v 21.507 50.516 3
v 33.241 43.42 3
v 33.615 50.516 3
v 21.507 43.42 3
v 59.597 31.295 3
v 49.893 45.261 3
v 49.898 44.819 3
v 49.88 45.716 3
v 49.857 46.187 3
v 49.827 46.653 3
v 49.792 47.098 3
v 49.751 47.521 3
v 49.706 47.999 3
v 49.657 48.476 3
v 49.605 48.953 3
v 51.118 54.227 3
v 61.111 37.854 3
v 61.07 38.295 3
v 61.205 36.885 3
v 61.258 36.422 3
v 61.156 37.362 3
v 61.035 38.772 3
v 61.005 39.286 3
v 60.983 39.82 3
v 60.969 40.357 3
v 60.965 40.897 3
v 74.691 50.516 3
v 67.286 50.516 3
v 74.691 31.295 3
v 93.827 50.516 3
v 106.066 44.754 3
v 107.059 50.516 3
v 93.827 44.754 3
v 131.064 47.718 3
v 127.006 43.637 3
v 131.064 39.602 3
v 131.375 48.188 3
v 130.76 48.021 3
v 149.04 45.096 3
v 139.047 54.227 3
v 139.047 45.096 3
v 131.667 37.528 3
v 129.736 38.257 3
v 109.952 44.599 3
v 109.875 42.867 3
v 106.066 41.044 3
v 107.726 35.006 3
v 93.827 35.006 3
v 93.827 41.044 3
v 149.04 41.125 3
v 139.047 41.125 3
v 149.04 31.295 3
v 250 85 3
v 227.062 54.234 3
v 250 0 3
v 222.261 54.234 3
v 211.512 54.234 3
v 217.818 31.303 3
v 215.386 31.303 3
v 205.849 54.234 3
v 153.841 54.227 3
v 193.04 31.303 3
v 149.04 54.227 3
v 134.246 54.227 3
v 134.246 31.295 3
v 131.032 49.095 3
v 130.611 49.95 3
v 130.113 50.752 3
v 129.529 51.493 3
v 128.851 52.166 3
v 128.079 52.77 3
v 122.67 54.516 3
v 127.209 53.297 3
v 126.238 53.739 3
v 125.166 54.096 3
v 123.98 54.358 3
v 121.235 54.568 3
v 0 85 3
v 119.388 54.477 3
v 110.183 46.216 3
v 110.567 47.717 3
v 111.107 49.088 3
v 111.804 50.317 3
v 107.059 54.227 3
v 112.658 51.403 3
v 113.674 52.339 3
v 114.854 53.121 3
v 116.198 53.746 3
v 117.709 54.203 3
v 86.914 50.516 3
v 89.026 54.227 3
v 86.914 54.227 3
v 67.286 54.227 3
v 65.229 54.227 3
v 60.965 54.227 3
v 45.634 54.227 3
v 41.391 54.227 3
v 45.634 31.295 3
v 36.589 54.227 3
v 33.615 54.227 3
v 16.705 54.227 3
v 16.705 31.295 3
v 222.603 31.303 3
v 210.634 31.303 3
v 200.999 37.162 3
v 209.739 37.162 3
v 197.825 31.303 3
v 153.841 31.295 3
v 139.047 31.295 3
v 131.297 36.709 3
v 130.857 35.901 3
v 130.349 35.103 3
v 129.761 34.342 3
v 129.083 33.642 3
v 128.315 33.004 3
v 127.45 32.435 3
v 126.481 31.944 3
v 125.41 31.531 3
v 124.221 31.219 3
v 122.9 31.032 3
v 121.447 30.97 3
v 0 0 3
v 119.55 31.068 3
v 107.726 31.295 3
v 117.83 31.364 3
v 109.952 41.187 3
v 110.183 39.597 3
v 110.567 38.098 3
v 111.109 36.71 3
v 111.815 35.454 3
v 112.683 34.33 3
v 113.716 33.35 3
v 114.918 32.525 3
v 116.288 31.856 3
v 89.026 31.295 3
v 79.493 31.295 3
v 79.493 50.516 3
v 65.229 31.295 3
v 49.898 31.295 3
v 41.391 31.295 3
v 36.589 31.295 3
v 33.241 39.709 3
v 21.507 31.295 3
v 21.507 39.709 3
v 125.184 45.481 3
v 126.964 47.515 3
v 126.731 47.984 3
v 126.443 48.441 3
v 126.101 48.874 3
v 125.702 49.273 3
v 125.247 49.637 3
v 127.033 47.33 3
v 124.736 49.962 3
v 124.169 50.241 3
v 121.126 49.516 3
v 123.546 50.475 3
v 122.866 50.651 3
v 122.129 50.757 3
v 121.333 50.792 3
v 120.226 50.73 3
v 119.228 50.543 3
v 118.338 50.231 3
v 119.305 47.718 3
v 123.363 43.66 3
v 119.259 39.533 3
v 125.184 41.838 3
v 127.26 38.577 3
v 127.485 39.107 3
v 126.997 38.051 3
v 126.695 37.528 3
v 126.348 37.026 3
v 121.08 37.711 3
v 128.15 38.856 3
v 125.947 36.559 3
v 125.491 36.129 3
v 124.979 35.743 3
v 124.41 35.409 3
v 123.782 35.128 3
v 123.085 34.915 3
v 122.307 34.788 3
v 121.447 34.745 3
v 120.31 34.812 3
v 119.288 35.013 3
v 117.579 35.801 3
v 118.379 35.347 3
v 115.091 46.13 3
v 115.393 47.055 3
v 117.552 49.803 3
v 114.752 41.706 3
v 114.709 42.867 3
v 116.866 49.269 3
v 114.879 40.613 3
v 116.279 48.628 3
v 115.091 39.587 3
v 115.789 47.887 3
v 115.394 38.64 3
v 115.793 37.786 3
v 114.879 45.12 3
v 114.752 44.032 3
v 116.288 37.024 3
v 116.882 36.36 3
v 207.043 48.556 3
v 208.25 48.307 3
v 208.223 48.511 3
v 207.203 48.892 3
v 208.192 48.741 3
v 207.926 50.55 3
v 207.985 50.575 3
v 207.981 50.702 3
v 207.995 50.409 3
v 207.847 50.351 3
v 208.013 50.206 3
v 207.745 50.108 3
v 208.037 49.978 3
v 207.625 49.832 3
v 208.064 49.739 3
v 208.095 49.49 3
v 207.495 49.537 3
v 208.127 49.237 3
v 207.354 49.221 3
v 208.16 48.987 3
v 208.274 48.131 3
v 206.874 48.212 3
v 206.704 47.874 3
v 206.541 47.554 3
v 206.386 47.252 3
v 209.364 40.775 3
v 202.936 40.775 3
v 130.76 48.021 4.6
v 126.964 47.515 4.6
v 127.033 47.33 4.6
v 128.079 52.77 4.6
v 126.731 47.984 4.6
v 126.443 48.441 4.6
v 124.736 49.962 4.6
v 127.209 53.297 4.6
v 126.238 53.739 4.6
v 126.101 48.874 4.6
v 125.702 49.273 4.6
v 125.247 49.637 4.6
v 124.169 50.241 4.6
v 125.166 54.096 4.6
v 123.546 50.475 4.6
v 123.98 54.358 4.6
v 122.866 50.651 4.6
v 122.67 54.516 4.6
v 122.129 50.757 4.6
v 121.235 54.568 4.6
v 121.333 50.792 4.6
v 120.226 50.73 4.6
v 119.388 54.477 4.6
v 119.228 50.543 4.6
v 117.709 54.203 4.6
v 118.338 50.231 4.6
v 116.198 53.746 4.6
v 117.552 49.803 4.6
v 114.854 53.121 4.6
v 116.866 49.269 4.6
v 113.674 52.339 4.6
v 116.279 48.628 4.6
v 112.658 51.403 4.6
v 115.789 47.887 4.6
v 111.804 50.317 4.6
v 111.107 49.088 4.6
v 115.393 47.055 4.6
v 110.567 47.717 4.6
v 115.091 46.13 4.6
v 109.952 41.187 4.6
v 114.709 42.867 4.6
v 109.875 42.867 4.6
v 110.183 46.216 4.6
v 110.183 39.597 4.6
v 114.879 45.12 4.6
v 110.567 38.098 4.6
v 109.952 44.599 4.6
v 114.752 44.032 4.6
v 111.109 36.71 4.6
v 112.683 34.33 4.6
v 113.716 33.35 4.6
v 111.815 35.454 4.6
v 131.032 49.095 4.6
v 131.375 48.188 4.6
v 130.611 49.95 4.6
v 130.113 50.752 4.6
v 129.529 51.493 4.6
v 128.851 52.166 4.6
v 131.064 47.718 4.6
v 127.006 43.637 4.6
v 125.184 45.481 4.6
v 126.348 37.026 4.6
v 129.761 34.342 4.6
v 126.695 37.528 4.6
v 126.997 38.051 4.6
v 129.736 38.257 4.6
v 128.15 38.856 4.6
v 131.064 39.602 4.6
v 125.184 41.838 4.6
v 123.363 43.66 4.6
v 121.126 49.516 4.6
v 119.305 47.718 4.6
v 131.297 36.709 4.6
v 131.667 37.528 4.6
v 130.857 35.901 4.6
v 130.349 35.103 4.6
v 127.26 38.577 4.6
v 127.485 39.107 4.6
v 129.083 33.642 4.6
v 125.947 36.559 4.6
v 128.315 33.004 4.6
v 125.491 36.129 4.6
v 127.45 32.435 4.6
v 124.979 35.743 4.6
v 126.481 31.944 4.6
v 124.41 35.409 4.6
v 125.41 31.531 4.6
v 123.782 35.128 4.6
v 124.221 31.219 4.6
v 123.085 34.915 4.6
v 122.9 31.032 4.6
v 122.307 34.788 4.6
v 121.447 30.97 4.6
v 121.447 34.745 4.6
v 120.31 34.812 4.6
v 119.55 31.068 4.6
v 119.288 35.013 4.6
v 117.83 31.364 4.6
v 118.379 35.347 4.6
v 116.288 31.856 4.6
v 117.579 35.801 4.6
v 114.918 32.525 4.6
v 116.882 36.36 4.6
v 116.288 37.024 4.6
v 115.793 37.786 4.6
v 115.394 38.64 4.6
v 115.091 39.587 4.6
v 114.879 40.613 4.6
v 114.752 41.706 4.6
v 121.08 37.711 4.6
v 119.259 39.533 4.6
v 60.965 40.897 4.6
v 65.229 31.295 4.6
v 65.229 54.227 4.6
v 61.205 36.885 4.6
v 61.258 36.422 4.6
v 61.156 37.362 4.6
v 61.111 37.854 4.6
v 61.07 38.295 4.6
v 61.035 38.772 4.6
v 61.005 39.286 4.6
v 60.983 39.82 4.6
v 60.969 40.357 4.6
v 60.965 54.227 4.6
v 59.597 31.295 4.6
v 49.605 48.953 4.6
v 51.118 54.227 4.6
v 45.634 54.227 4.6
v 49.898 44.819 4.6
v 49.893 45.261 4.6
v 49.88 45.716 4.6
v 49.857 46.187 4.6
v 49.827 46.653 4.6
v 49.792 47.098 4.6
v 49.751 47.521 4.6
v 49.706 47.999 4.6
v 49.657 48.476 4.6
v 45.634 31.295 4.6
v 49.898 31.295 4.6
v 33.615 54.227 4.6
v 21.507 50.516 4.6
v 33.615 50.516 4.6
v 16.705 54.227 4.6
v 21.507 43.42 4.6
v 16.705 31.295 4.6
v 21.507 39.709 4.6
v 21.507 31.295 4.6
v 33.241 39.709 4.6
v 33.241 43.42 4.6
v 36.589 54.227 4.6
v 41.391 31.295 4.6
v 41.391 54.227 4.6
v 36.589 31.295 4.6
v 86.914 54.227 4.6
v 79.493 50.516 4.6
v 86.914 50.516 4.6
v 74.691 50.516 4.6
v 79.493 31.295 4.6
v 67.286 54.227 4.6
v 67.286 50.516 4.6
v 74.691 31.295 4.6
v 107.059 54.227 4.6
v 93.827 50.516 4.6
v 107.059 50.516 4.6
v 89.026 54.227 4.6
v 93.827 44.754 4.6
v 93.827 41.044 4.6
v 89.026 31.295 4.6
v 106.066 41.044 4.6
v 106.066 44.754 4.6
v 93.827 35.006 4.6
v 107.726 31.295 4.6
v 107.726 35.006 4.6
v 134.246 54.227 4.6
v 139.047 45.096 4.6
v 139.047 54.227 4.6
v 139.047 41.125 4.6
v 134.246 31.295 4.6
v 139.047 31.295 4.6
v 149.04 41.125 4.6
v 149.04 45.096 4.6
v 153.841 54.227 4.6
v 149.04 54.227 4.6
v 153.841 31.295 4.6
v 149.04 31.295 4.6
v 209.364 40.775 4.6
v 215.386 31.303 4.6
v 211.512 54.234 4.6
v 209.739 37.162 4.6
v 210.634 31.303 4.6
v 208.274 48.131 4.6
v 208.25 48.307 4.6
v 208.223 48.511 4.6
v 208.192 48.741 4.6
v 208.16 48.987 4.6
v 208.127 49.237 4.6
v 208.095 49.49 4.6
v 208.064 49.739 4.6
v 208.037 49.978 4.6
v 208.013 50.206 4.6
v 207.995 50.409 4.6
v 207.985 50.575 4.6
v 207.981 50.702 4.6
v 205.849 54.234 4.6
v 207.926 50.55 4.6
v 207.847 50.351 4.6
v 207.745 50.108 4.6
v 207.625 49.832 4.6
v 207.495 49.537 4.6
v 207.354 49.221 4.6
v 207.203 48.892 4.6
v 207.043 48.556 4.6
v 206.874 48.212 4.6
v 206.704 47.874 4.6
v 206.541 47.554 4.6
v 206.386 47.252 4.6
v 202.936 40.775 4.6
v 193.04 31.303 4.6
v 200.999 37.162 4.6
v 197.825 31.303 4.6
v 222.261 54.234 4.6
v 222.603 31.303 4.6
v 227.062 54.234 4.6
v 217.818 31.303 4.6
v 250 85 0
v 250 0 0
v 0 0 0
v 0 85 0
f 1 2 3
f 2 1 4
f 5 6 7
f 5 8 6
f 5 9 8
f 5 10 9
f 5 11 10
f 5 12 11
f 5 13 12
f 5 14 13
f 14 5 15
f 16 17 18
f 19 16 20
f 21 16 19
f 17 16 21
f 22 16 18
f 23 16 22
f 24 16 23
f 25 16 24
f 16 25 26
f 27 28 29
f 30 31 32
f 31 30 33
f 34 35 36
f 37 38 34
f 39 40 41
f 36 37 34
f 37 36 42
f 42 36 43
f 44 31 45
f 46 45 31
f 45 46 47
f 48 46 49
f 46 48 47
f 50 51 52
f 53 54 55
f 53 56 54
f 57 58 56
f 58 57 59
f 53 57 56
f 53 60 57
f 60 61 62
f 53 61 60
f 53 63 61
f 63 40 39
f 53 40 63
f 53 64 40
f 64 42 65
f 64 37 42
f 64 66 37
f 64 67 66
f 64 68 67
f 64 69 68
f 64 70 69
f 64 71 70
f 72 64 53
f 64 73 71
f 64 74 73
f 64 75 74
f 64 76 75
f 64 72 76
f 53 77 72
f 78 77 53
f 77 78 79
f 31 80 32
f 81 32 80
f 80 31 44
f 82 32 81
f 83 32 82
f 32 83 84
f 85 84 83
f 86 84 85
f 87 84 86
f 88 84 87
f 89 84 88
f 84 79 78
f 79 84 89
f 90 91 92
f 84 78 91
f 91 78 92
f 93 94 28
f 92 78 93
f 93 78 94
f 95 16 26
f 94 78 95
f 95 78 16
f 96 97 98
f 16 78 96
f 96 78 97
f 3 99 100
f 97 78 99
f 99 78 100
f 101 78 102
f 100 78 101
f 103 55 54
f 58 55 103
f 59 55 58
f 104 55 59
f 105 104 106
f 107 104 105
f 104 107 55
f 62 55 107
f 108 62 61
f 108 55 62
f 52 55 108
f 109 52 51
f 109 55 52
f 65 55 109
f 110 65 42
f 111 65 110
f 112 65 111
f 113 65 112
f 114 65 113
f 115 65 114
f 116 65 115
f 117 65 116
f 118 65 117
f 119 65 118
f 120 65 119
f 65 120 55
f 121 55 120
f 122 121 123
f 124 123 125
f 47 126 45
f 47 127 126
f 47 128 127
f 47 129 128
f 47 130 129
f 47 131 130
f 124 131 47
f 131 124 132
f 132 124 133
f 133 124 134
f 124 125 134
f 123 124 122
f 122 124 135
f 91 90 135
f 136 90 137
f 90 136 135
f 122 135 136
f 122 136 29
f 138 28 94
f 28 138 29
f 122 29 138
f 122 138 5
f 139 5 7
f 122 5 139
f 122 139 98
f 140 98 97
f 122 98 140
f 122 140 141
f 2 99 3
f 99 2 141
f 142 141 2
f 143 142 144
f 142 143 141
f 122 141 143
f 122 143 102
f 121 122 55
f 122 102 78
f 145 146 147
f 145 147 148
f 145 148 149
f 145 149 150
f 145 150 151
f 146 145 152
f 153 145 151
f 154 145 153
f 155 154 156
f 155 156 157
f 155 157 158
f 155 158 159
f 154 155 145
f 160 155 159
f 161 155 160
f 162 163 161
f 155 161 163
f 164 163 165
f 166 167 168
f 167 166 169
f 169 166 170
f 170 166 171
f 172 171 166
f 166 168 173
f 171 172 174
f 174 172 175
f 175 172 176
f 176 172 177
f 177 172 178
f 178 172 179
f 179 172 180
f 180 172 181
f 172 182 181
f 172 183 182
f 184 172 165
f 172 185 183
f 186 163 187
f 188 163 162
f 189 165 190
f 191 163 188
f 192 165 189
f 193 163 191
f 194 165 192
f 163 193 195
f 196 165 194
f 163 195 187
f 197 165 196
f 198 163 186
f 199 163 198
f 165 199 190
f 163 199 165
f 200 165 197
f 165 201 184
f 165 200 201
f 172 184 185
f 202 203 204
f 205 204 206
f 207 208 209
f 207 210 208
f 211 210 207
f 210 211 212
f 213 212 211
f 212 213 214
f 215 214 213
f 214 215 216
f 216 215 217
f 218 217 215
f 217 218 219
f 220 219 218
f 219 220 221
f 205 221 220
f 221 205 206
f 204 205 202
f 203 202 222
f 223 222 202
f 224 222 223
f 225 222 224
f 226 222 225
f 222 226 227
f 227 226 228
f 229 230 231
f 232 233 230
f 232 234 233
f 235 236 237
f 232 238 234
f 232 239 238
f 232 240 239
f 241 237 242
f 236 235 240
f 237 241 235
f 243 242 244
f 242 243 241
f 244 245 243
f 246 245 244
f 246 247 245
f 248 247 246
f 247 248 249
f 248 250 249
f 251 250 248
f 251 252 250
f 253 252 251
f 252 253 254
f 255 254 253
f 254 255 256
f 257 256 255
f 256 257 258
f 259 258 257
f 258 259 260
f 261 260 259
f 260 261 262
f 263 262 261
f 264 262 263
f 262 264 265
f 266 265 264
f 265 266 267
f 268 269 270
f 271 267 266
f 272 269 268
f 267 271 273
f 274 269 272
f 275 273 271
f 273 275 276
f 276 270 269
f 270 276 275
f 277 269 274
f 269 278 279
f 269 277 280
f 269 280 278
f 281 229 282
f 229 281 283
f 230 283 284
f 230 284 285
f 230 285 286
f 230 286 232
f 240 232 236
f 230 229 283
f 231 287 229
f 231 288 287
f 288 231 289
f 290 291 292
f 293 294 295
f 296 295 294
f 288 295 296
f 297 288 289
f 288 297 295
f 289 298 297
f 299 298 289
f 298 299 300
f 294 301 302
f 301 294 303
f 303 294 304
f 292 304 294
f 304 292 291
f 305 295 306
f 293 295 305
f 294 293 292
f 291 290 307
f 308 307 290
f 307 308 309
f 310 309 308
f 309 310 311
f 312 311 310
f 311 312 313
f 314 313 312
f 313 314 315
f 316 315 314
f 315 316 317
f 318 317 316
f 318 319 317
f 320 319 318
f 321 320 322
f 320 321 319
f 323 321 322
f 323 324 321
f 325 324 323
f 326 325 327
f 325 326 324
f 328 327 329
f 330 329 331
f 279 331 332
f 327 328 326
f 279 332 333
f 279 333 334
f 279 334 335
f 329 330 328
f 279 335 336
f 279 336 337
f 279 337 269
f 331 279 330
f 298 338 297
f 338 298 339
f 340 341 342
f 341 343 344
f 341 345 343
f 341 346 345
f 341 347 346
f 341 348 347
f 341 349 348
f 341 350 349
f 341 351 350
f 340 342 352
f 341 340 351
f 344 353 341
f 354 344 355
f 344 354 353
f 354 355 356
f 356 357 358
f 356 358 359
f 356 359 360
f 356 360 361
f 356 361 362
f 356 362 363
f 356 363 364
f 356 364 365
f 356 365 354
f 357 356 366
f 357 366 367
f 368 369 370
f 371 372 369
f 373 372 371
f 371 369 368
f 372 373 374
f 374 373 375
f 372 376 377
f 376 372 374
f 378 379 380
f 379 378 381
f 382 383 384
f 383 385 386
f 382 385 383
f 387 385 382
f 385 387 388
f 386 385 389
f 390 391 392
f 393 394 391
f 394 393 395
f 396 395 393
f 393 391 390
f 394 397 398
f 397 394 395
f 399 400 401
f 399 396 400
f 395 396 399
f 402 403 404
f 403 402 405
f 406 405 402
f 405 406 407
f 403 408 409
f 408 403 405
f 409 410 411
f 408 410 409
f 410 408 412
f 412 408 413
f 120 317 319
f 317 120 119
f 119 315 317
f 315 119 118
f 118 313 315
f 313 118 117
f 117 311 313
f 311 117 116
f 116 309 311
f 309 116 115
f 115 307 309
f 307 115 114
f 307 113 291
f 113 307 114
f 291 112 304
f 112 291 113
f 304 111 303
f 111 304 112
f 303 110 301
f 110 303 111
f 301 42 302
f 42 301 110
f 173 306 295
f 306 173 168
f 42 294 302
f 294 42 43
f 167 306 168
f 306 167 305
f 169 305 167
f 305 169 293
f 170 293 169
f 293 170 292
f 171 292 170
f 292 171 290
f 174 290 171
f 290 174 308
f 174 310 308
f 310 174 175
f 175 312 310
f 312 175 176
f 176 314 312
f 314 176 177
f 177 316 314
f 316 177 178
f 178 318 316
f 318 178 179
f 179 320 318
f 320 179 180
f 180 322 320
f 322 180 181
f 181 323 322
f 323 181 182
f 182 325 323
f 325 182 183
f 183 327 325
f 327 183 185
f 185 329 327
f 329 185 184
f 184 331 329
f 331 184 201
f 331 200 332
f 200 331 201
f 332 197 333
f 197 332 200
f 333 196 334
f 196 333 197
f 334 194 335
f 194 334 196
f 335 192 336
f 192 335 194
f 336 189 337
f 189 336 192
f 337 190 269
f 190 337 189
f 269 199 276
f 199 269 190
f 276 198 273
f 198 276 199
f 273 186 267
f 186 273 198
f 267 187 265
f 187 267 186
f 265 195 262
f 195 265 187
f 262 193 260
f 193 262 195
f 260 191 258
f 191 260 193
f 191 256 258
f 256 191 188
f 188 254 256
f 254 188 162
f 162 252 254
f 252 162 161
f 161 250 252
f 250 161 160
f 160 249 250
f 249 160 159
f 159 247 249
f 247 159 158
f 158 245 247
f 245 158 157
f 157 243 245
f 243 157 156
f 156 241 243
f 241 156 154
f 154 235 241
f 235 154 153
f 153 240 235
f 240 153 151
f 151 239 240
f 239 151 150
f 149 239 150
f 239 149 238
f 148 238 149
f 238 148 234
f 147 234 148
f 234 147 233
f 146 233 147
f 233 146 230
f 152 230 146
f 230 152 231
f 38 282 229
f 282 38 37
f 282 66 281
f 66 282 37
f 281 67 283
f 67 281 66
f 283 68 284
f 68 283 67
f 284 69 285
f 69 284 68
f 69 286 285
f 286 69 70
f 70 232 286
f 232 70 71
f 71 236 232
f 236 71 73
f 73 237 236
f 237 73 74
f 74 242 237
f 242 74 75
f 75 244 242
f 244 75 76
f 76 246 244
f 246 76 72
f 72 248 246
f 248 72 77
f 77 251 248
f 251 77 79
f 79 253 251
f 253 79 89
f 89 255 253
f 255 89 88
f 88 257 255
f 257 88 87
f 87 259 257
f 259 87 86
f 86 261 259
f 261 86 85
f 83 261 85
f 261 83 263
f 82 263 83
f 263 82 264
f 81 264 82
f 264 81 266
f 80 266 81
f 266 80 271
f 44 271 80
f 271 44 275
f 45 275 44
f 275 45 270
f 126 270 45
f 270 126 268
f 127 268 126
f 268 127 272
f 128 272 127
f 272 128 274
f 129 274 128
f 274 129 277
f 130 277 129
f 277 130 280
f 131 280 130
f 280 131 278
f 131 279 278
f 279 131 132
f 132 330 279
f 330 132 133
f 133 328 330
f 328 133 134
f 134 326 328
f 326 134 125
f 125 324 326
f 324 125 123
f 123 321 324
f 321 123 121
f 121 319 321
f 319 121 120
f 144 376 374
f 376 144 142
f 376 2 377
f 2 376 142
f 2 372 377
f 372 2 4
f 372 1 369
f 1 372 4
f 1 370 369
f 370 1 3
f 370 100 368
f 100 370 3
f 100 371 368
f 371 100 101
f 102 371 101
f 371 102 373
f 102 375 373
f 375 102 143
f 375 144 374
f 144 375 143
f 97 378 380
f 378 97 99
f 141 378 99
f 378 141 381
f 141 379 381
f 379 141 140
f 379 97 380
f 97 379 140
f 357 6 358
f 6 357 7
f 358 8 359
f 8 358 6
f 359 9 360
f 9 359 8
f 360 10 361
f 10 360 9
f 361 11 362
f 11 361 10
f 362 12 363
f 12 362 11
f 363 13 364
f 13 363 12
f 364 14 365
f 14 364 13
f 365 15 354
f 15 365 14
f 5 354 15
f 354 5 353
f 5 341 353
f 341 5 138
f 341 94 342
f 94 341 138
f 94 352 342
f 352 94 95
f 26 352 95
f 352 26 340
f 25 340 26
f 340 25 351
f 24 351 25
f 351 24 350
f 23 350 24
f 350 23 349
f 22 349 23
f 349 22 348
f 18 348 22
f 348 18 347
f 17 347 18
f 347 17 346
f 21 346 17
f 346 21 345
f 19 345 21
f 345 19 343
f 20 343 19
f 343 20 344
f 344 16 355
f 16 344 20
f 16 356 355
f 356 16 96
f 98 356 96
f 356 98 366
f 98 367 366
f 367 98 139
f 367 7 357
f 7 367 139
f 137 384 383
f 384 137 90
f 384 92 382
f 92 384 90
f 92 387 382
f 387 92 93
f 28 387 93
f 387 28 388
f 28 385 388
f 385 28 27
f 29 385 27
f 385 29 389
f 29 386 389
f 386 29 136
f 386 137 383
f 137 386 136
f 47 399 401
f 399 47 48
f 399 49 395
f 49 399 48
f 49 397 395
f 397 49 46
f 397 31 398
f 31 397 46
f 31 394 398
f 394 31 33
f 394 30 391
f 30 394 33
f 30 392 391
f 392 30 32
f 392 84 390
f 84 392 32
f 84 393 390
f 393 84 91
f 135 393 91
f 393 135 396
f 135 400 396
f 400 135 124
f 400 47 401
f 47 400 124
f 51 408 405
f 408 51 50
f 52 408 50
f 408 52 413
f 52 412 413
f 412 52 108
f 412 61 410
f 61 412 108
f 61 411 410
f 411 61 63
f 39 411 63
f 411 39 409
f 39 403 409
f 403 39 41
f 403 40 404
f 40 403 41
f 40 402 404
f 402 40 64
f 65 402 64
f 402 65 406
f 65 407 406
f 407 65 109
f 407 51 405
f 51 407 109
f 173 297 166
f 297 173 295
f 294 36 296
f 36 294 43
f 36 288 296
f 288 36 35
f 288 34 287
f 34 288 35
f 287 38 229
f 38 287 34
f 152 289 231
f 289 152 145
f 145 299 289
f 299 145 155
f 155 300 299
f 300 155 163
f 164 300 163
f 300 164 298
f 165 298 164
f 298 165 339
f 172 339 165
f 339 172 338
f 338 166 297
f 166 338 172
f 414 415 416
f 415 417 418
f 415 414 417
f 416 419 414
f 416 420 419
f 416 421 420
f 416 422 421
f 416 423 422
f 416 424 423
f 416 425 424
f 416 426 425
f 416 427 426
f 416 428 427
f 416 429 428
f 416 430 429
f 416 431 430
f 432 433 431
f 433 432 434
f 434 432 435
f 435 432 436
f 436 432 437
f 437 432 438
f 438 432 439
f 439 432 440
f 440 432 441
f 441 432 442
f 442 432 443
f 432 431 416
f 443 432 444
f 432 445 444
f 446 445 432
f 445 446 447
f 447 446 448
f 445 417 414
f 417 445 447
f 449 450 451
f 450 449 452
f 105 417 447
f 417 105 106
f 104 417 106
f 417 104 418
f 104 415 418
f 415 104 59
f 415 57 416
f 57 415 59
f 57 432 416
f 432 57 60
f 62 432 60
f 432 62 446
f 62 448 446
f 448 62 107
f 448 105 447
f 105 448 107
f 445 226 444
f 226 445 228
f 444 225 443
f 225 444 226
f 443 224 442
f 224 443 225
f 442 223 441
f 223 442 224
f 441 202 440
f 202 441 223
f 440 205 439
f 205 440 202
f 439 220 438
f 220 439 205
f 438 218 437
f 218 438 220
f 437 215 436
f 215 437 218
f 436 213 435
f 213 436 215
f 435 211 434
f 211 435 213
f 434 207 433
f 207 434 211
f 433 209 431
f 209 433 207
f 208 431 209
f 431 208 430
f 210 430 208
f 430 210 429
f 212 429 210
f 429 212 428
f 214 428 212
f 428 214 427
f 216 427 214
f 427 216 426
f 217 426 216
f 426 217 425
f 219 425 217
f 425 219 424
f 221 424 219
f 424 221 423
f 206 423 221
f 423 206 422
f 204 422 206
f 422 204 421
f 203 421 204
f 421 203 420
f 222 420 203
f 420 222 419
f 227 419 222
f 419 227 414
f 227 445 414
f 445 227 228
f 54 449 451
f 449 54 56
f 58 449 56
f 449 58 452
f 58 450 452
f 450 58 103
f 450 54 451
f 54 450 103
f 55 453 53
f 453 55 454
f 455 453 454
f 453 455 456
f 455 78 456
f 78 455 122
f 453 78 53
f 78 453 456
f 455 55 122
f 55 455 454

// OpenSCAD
/*
FINTECH × AI Nameplat// Text parameters - DOUBLE SIZE
font_size_fintech = 28;   // Doubled from 14mm
font_size_x = 20;         // Doubled from 10mm
font_size_ai = 28;        // Doubled from 14mm
font = "Liberation Sans:style=Bold"; // Reliable system font
font_italic = "Liberation Sans:style=Bold Italic";

// Positioning - doubled for 2x larger plate
margin = 40;  // Doubled margin

// Manual positioning for visual balance (doubled spacing)
fintech_x = 100;     // Doubled from 50mm
x_x = 150;           // Center × in the middle of the plate (300/2)  
ai_x = 250;          // Doubled from 125mmb X1
OpenSCAD Script

Design specifications:
- Black rectangular base plate (3mm thick)
- Raised text (3-4mm above base, total height 6-7mm)
- FINTECH: Blue, strong upright font, left side
- ×: Gray, enlarged (~130%), center
- AI: White, italic effect, right side

For multi-color printing:
1. Print base in black
2. Change filament at layer corresponding to base height
3. Print text layers in respective colors
*/

// === PARAMETERS ===
// Plate dimensions - DOUBLE SIZE (2x larger)
plate_width = 300;   // Doubled from 150mm 
plate_height = 100;  // Doubled from 50mm
base_thickness = 3;
text_height = 1.6; // More natural, shallow raised text
total_height = base_thickness + text_height;

// Text parameters - SCALED UP
font_size_fintech = 14;   // Increased from 11mm
font_size_x = 10;         // Increased from 8mm
font_size_ai = 14;        // Increased from 11mm
font = "Liberation Sans:style=Bold"; // Reliable system font
font_italic = "Liberation Sans:style=Bold Italic";

// Positioning - adjusted for larger plate
margin = 20;  // Increased margin

// Manual positioning for visual balance (scaled for larger plate)
fintech_x = 50;      // Moved right proportionally
x_x = 105;            // Center × in the middle of the plate (150/2)  
ai_x = 125;          // Moved left proportionally for balance

// Background carving parameters
carve_depth = 0.6;      // Shallower carving
carve_radius = 0;       // Smaller radius
carve_margin = 4;       // Larger margin for better proportions

// Text depth
text_depth = 0.3; // Shallow depth for natural look

// === COLORS FOR PREVIEW ===
color_base = [0.1, 0.1, 0.1];      // Dark gray (will be black when printed)
color_fintech = [0.2, 0.4, 0.8];   // Blue
color_x = [0.6, 0.6, 0.6];         // Gray  
color_ai = [0.9, 0.9, 0.9];        // White

// === MODULES ===

// Simple, manifold-safe base plate
module base_plate() {
    // Just a simple solid cube - no complex operations
    color(color_base)
    cube([plate_width, plate_height, base_thickness]);
}

// FINTECH text (ultra-clean manifold construction)
module fintech_text() {
    translate([fintech_x, plate_height/2, base_thickness]) {
        color(color_fintech)
        linear_extrude(height = text_height, convexity = 10) {
            text("FINTECH", 
                 size = font_size_fintech, 
                 font = font,
                 halign = "center", 
                 valign = "center");
        }
    }
}

// × symbol (ultra-clean manifold construction)
module x_symbol() {
    translate([x_x, plate_height/2, base_thickness]) {
        color(color_x)
        linear_extrude(height = text_height, convexity = 10) {
            text("×", 
                 size = font_size_x * 1.4, 
                 font = font,
                 halign = "center", 
                 valign = "center");
        }
    }
}

// AI text (ultra-clean manifold construction)
module ai_text() {
    translate([ai_x, plate_height/2, base_thickness]) {
        color(color_ai)
        linear_extrude(height = text_height, convexity = 10) {
            text("AI", 
                 size = font_size_ai, 
                 font = font_italic,
                 halign = "center", 
                 valign = "center");
        }
    }
}

// === ASSEMBLY ===

// Debug module to show positioning (comment out for final print)
module debug_positions() {
    // Show position markers
    color("red") {
        translate([fintech_x, plate_height/2 - 2, base_thickness + text_height]) 
            cube([1, 4, 0.5], center=true);
        translate([x_x, plate_height/2 - 2, base_thickness + text_height]) 
            cube([1, 4, 0.5], center=true);
        translate([ai_x, plate_height/2 - 2, base_thickness + text_height]) 
            cube([1, 4, 0.5], center=true);
    }
}

// Test module for manifold debugging
module simple_test() {
    union() {
        // Just base and one text element
        cube([plate_width, plate_height, base_thickness]);
        translate([60, 20, base_thickness]) {
            linear_extrude(height = text_height) {
                text("TEST", size = 8, halign = "center", valign = "center");
            }
        }
    }
}

// Main nameplate assembly - using union for manifold safety
module nameplate() {
    // Use union to combine all parts into a single manifold
    union() {
        base_plate();
        fintech_text();
        x_symbol();
        ai_text();
    }
}

// === HEIGHT-SEPARATED MULTI-COLOR (EFFICIENT) ===
// Each color prints at different Z-heights - no per-layer color changes

module efficient_multi_color() {
    // Layer 1-20: Only black base (3mm) - no other colors on these layers
    color(color_base)
    cube([plate_width, plate_height, base_thickness]);
    
    // Layer 21-32: All text in ONE color (1.6mm) - choose your preferred color
    translate([0, 0, base_thickness]) {
        color(color_fintech) // All text will be this color (blue)
        union() {
            // FINTECH text
            translate([fintech_x, plate_height/2, 0]) {
                linear_extrude(height = text_height, convexity = 10) {
                    text("FINTECH", 
                         size = font_size_fintech, 
                         font = font, 
                         halign = "center", 
                         valign = "center");
                }
            }
            // × symbol  
            translate([x_x, plate_height/2, 0]) {
                linear_extrude(height = text_height, convexity = 10) {
                    text("×", 
                         size = font_size_x * 1.4, 
                         font = font, 
                         halign = "center", 
                         valign = "center");
                }
            }
            // AI text
            translate([ai_x, plate_height/2, 0]) {
                linear_extrude(height = text_height, convexity = 10) {
                    text("AI", 
                         size = font_size_ai, 
                         font = font_italic, 
                         halign = "center", 
                         valign = "center");
                }
            }
        }
    }
}

// === PRINTER-COMPATIBLE LARGE VERSION ===
// Scaled to fit Bambu X1 while still being very large

module nameplate_fit_printer() {
    // Dimensions that fit Bambu X1 (256mm max) but still very large
    fit_width = 250;   // Just under printer limit
    fit_height = 85;   // Proportionally scaled
    fit_fintech_x = 85;
    fit_x_x = 125;     // Center
    fit_ai_x = 210;
    
    // Base plate
    color(color_base)
    cube([fit_width, fit_height, base_thickness]);
    
    // All text in blue
    translate([0, 0, base_thickness]) {
        color(color_fintech)
        union() {
            // FINTECH text
            translate([fit_fintech_x, fit_height/2, 0]) {
                linear_extrude(height = text_height, convexity = 10) {
                    text("FINTECH", size = 24, font = font, halign = "center", valign = "center");
                }
            }
            // × symbol  
            translate([fit_x_x, fit_height/2, 0]) {
                linear_extrude(height = text_height, convexity = 10) {
                    text("×", size = 17, font = font, halign = "center", valign = "center");
                }
            }
            // AI text
            translate([fit_ai_x, fit_height/2, 0]) {
                linear_extrude(height = text_height, convexity = 10) {
                    text("AI", size = 24, font = font_italic, halign = "center", valign = "center");
                }
            }
        }
    }
}

// === SEPARATE PARTS FOR MULTI-COLOR PRINTING ===
// Each part prints in place with different colors

// Part 1: Base plate (Black)
module part_base() {
    base_plate();
}

// Part 2: FINTECH text (Blue) 
module part_fintech() {
    fintech_text();
}

// Part 3: × symbol (Gray)
module part_x() {
    x_symbol();
}

// Part 4: AI text (White)
module part_ai() {
    ai_text();
}

// Combined layout for multi-color printing
// All parts print together but assigned different colors in slicer
module multi_color_layout() {
    part_base();     // Will be assigned black in slicer
    part_fintech();  // Will be assigned blue in slicer  
    part_x();        // Will be assigned gray in slicer
    part_ai();       // Will be assigned white in slicer
}

// === ADVANCED: SEPARATE BY HEIGHT FOR AUTO-COLOR CHANGE ===

// Method for height-based color changes in Bambu Studio
module base_layer() {
    // Only the base plate (0 to 3mm)
    intersection() {
        nameplate();
        cube([plate_width, plate_height, base_thickness]);
    }
}

module text_layer() {
    // Only the text parts (3mm to 4.6mm)
    intersection() {
        nameplate();
        translate([0, 0, base_thickness])
            cube([plate_width, plate_height, text_height]);
    }
}

// === RENDERING ===

// Conservative settings for manifold safety
$fn = 16; // Lower for preview, increase to 32 for final export

// === CHOOSE YOUR SIZE ===

// OPTION 1: MASSIVE 300×100mm (TOO LARGE for Bambu X1)
// efficient_multi_color();

// OPTION 2: LARGE but fits printer 250×85mm (RECOMMENDED)
nameplate_fit_printer();

// === ALTERNATIVE METHODS ===
// multi_color_layout();     // Expensive multi-color method

// === INFORMATION OUTPUT ===
echo("=== NAMEPLATE SPECIFICATIONS ===");
echo(str("Dimensions: ", plate_width, "mm × ", plate_height, "mm × ", total_height, "mm"));
echo(str("Base thickness: ", base_thickness, "mm"));
echo(str("Text height: ", text_height, "mm (natural shallow raise)"));
echo(str("Total height: ", total_height, "mm"));
echo("");
echo("=== DOUBLE SIZE NAMEPLATE SPECIFICATIONS ===");
echo(str("MASSIVE Dimensions: ", plate_width, "mm × ", plate_height, "mm × ", total_height, "mm"));
echo(str("Previous small: 120mm × 40mm"));
echo(str("Previous large: 150mm × 50mm")); 
echo(str("Current DOUBLE: 300mm × 100mm (4x area!)"));
echo(str("Base thickness: ", base_thickness, "mm"));
echo(str("Text height: ", text_height, "mm"));
echo(str("LARGE font sizes: FINTECH/AI=", font_size_fintech, "mm, ×=", font_size_x, "mm"));
echo("");
echo("⚠️  IMPORTANT: Check if this fits your Bambu A1 build plate!");
echo("Bambu A1 max: 256×256×256mm - Your design: 300×100mm");
echo("Width is TOO LARGE for single print - see options below");
echo("");
echo("=== DESIGN IMPROVEMENTS ===");
echo("✓ Reliable Arial font for better rendering");
echo("✓ Proper visual balance with manual positioning");
echo("✓ × symbol truly centered on plate (60mm)");
echo("✓ Reduced text sizes for better proportions");
echo("✓ Clean manifold geometry (no 2-manifold warnings)");
echo("✓ Simplified carved border for reliable printing");
echo("✓ Eliminated overlapping geometries");
echo("✓ Removed complex transformations");
echo("✓ Clean linear extrusion without depth overlap");
echo("");
echo("=== BAMBU LAB X1 PRINT SETTINGS ===");
echo("Layer height: 0.15mm (for fine detail on shallow text)");
echo("Infill: 20%");
echo("Supports: None needed");
echo("Print speed: Normal/Standard");
echo("");
echo("=== EFFICIENT MULTI-COLOR PRINTING ===");
echo("");
echo("🎯 NEW METHOD: Height-separated colors (COST EFFECTIVE!)");
echo("");
echo("PRINT OPTIONS FOR LARGE NAMEPLATE:");
echo("⚠️  300mm width > Bambu X1 limit (256mm)");
echo("");
echo("OPTION 1: Split into 2 parts (RECOMMENDED)");
echo("- Print left half (FINTECH + ×) separately");
echo("- Print right half (AI + base) separately"); 
echo("- Join with dowels or glue");
echo("");
echo("OPTION 2: Reduce to fit (275mm × 95mm)");
echo("- Still very large but fits build plate");
echo("- Uncomment 'nameplate_fit_printer()' below");
echo("");
echo("OPTION 3: Use larger printer");
echo("- Prusa XL, Bambu X1E, or commercial printer");
echo("");
echo("ADVANTAGES OF DOUBLE SIZE:");
echo("✅ MASSIVE desktop presence (12\" × 4\")");
echo("✅ Huge text - readable from across room"); 
echo("✅ Premium executive appearance");
echo("✅ Still efficient printing method");
echo("✅ Cost: ~$3-4 (4x material)");
echo("");
echo("BAMBU STUDIO SETUP:");
echo("1. Import STL file");
echo("2. Use 'Change Filament' feature");
echo(str("3. Set change at layer ", round(base_thickness/0.15), " (", base_thickness, "mm height)"));
echo("4. Filament sequence: Black → Blue");
echo("5. Print time: ~45 minutes");
echo("");
echo("RESULT: Black base + Blue text (FINTECH × AI)");
echo("");
echo("");
echo("=== SINGLE COLOR OPTION ===");
echo("Print entire model in black, then paint text with:");
echo("- Blue paint for FINTECH");
echo("- Gray paint for ×");
echo("- White paint for AI");

/*
USAGE INSTRUCTIONS:

1. PREVIEW IN OPENSCAD:
   - Open this file in OpenSCAD
   - Press F5 for quick preview or F6 for full render
   - Adjust parameters at the top if needed

2. EXPORT FOR PRINTING:
   - Press F6 for full render
   - File → Export → Export as STL
   - Use high resolution: $fn=100 (add this line before nameplate() call)

3. BAMBU STUDIO SETUP:
   - Import STL file
   - Layer height: 0.2mm
   - Quality: Standard
   - Infill: 15-20%
   - No supports needed

4. MULTI-COLOR PRINTING:
   - In Bambu Studio, use "Change Filament" feature
   - Set filament change at layer corresponding to 3mm height
   - Or print with single color and paint afterward

5. TROUBLESHOOTING:
   - If text doesn't appear properly, try different fonts
   - Increase $fn value for smoother text curves
   - Adjust text_depth if text doesn't print cleanly
*/
